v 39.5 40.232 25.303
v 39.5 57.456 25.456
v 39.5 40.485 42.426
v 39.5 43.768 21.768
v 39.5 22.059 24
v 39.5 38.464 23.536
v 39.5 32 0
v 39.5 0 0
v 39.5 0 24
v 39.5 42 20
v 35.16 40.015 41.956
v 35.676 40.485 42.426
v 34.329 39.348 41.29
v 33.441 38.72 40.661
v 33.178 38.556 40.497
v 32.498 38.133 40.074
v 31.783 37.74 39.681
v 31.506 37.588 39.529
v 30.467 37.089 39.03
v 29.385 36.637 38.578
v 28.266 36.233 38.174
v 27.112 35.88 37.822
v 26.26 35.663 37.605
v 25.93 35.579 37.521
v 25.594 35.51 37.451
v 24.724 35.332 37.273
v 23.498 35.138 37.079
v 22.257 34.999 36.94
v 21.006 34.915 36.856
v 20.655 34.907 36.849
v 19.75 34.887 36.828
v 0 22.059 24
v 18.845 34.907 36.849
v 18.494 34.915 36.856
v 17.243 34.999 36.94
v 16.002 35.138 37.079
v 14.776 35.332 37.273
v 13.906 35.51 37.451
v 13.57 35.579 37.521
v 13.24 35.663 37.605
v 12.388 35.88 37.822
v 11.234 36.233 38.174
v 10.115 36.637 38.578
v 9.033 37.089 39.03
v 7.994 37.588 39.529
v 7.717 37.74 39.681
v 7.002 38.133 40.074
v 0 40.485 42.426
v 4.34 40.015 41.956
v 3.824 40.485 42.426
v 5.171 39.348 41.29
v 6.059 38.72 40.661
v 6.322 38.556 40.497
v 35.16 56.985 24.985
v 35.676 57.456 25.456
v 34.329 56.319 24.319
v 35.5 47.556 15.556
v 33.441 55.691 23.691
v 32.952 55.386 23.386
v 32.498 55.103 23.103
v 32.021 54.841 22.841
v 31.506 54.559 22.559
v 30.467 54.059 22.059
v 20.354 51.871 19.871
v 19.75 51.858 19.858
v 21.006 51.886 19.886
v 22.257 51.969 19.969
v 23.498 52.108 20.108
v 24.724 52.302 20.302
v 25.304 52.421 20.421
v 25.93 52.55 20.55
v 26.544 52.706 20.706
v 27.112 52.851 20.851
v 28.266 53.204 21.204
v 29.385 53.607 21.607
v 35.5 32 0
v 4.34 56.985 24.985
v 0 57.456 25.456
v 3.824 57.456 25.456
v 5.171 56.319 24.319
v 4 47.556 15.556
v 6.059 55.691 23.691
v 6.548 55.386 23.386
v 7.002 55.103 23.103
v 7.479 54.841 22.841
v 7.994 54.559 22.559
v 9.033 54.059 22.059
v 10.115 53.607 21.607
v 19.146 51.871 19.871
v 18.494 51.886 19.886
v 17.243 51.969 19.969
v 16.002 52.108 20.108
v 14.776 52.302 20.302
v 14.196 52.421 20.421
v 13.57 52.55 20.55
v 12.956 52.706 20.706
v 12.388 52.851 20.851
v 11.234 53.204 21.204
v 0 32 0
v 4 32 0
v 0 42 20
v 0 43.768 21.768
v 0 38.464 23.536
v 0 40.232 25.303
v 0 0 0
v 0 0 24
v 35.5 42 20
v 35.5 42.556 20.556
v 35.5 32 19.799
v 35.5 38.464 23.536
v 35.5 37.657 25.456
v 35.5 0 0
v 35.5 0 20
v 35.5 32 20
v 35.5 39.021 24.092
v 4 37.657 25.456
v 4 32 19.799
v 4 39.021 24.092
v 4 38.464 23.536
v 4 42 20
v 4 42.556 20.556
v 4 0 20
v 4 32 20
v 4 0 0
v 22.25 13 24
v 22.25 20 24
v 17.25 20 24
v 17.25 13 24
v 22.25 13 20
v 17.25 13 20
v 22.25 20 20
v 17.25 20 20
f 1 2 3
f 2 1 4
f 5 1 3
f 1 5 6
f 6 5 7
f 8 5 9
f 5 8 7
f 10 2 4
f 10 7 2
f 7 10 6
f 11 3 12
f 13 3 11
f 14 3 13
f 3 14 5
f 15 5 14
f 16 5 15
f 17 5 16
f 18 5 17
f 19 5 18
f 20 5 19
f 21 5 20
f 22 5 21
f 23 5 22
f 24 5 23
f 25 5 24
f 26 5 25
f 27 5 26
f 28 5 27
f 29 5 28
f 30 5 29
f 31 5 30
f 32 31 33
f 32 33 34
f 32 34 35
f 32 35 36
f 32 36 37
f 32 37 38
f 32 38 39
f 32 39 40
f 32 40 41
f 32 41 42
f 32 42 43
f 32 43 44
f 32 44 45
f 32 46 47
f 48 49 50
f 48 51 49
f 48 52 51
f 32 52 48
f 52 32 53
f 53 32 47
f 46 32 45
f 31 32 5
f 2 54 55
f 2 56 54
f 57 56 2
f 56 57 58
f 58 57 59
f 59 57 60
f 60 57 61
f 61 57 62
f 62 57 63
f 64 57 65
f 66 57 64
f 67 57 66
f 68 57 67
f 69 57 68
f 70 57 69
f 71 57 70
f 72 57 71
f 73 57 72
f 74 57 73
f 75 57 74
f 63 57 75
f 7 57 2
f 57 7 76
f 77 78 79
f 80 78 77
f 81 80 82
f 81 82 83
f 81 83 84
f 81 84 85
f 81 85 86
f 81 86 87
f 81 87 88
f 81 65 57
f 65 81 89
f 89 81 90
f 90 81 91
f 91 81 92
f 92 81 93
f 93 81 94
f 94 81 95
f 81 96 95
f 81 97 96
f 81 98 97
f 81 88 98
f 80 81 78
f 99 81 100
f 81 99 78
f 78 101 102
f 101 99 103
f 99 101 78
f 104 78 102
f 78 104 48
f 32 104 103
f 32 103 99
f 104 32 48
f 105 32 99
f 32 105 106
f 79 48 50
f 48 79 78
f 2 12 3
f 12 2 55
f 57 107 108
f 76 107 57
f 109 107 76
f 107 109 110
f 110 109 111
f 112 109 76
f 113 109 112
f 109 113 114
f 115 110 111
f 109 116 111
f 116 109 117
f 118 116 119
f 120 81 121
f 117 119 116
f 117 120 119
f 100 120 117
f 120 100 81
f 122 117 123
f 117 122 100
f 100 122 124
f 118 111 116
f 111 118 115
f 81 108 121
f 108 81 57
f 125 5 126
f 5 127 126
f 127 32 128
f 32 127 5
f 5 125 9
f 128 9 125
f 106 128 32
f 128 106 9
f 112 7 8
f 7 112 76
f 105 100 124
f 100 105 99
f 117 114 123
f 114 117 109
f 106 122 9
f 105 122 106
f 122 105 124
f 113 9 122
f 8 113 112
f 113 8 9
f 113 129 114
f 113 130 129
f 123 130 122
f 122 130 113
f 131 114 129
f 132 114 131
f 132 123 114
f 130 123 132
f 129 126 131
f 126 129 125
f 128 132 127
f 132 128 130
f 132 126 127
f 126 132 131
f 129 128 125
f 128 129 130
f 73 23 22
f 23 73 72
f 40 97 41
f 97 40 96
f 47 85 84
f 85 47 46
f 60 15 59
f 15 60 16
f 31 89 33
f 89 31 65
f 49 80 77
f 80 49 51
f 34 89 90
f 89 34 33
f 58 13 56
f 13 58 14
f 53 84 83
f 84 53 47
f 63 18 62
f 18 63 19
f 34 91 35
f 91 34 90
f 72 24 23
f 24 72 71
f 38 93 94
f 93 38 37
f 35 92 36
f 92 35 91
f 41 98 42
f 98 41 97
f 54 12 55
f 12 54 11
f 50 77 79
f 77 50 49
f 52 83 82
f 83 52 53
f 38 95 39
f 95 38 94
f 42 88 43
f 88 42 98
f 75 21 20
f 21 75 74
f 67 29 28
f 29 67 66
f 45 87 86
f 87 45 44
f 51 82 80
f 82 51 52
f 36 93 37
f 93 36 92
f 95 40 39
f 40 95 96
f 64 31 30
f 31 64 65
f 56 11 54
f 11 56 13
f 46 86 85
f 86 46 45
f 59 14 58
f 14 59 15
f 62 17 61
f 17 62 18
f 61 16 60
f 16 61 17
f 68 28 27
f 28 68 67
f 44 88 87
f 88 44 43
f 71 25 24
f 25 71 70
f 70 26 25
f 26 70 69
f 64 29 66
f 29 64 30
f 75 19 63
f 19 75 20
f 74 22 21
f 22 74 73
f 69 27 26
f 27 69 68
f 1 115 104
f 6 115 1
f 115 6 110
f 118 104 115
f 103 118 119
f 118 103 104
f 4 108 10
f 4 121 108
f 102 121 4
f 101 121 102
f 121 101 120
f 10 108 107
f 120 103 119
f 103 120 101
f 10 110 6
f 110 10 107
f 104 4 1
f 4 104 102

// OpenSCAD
//Configurable dish feed mount for square posts

//make the curve smooth by setting number of faces
$fn = 100;

//inner dimensions in mm of the mounting hole
MountingHoleX = 5;
MountingHoleY = 7;

//inner dimensions of the square fitting
//this part sits on the square post
BodyZ = 20;
BodyY = 32;
BodyX = 31.5;

//dimension required for the section that sets
//the angle of the LNB with respect to dish face
BraceBodyZ = 20;

//mounting angle in degrees
MountingAngle = 135;

//diameter of the LNB
LNBDiameter = 40;

//wall thickness of the part
WallThickness = 4;





difference()
{
    difference() 
    {
        union()
        {
            //make block for outside
            cube([BodyX+WallThickness+WallThickness, BodyY, BodyZ+WallThickness]);
            
            //make brace block, the section that angles the LNB
            translate([0, BodyY,0]) rotate(a=180-MountingAngle, v = [1, 0, 0]) 
        
            difference()
            {
                //outside of brace block
                cube([BodyX+WallThickness+WallThickness, BodyY+WallThickness, BraceBodyZ+WallThickness]);
                
                //cutting block for cable tie wrap might better go here instead
        
                //remove excess material from inside brace block
                translate([WallThickness, 0, 0])
                cube([BodyX, BodyY-10, BraceBodyZ-(1.5*WallThickness)]);
            }
        }
        //cutting block for inside of holder
        translate([WallThickness, 0, 0])
        cube([BodyX, BodyY, BodyZ]);
    }
    
    difference()
    {
        //cutting block for mounting hole
        translate([BodyX/2 + WallThickness, 13+(MountingHoleY/2),0])
        cube([MountingHoleX, MountingHoleY, 60], true);
    }
    
    difference()
    {
        //cutting block for typical LNB body (e.g 40mm diameter)
        translate([BodyX/2+WallThickness, 3*BodyY+WallThickness,0]) 
        rotate(a=180-MountingAngle, v = [1, 0, 0])
        cylinder(100, LNBDiameter/2, LNBDiameter/2);
    
    }
    
    difference()
    {
        //cutting block for cable tie or similar fastener
        
        //this really needs to be done earlier
        //as in, with the brace block
        
        translate([-WallThickness, BodyY+10, BodyZ])
        rotate(a=180-MountingAngle, v = [1, 0, 0])
        cube([50, MountingHoleX/2, MountingHoleX]);
    }

}
